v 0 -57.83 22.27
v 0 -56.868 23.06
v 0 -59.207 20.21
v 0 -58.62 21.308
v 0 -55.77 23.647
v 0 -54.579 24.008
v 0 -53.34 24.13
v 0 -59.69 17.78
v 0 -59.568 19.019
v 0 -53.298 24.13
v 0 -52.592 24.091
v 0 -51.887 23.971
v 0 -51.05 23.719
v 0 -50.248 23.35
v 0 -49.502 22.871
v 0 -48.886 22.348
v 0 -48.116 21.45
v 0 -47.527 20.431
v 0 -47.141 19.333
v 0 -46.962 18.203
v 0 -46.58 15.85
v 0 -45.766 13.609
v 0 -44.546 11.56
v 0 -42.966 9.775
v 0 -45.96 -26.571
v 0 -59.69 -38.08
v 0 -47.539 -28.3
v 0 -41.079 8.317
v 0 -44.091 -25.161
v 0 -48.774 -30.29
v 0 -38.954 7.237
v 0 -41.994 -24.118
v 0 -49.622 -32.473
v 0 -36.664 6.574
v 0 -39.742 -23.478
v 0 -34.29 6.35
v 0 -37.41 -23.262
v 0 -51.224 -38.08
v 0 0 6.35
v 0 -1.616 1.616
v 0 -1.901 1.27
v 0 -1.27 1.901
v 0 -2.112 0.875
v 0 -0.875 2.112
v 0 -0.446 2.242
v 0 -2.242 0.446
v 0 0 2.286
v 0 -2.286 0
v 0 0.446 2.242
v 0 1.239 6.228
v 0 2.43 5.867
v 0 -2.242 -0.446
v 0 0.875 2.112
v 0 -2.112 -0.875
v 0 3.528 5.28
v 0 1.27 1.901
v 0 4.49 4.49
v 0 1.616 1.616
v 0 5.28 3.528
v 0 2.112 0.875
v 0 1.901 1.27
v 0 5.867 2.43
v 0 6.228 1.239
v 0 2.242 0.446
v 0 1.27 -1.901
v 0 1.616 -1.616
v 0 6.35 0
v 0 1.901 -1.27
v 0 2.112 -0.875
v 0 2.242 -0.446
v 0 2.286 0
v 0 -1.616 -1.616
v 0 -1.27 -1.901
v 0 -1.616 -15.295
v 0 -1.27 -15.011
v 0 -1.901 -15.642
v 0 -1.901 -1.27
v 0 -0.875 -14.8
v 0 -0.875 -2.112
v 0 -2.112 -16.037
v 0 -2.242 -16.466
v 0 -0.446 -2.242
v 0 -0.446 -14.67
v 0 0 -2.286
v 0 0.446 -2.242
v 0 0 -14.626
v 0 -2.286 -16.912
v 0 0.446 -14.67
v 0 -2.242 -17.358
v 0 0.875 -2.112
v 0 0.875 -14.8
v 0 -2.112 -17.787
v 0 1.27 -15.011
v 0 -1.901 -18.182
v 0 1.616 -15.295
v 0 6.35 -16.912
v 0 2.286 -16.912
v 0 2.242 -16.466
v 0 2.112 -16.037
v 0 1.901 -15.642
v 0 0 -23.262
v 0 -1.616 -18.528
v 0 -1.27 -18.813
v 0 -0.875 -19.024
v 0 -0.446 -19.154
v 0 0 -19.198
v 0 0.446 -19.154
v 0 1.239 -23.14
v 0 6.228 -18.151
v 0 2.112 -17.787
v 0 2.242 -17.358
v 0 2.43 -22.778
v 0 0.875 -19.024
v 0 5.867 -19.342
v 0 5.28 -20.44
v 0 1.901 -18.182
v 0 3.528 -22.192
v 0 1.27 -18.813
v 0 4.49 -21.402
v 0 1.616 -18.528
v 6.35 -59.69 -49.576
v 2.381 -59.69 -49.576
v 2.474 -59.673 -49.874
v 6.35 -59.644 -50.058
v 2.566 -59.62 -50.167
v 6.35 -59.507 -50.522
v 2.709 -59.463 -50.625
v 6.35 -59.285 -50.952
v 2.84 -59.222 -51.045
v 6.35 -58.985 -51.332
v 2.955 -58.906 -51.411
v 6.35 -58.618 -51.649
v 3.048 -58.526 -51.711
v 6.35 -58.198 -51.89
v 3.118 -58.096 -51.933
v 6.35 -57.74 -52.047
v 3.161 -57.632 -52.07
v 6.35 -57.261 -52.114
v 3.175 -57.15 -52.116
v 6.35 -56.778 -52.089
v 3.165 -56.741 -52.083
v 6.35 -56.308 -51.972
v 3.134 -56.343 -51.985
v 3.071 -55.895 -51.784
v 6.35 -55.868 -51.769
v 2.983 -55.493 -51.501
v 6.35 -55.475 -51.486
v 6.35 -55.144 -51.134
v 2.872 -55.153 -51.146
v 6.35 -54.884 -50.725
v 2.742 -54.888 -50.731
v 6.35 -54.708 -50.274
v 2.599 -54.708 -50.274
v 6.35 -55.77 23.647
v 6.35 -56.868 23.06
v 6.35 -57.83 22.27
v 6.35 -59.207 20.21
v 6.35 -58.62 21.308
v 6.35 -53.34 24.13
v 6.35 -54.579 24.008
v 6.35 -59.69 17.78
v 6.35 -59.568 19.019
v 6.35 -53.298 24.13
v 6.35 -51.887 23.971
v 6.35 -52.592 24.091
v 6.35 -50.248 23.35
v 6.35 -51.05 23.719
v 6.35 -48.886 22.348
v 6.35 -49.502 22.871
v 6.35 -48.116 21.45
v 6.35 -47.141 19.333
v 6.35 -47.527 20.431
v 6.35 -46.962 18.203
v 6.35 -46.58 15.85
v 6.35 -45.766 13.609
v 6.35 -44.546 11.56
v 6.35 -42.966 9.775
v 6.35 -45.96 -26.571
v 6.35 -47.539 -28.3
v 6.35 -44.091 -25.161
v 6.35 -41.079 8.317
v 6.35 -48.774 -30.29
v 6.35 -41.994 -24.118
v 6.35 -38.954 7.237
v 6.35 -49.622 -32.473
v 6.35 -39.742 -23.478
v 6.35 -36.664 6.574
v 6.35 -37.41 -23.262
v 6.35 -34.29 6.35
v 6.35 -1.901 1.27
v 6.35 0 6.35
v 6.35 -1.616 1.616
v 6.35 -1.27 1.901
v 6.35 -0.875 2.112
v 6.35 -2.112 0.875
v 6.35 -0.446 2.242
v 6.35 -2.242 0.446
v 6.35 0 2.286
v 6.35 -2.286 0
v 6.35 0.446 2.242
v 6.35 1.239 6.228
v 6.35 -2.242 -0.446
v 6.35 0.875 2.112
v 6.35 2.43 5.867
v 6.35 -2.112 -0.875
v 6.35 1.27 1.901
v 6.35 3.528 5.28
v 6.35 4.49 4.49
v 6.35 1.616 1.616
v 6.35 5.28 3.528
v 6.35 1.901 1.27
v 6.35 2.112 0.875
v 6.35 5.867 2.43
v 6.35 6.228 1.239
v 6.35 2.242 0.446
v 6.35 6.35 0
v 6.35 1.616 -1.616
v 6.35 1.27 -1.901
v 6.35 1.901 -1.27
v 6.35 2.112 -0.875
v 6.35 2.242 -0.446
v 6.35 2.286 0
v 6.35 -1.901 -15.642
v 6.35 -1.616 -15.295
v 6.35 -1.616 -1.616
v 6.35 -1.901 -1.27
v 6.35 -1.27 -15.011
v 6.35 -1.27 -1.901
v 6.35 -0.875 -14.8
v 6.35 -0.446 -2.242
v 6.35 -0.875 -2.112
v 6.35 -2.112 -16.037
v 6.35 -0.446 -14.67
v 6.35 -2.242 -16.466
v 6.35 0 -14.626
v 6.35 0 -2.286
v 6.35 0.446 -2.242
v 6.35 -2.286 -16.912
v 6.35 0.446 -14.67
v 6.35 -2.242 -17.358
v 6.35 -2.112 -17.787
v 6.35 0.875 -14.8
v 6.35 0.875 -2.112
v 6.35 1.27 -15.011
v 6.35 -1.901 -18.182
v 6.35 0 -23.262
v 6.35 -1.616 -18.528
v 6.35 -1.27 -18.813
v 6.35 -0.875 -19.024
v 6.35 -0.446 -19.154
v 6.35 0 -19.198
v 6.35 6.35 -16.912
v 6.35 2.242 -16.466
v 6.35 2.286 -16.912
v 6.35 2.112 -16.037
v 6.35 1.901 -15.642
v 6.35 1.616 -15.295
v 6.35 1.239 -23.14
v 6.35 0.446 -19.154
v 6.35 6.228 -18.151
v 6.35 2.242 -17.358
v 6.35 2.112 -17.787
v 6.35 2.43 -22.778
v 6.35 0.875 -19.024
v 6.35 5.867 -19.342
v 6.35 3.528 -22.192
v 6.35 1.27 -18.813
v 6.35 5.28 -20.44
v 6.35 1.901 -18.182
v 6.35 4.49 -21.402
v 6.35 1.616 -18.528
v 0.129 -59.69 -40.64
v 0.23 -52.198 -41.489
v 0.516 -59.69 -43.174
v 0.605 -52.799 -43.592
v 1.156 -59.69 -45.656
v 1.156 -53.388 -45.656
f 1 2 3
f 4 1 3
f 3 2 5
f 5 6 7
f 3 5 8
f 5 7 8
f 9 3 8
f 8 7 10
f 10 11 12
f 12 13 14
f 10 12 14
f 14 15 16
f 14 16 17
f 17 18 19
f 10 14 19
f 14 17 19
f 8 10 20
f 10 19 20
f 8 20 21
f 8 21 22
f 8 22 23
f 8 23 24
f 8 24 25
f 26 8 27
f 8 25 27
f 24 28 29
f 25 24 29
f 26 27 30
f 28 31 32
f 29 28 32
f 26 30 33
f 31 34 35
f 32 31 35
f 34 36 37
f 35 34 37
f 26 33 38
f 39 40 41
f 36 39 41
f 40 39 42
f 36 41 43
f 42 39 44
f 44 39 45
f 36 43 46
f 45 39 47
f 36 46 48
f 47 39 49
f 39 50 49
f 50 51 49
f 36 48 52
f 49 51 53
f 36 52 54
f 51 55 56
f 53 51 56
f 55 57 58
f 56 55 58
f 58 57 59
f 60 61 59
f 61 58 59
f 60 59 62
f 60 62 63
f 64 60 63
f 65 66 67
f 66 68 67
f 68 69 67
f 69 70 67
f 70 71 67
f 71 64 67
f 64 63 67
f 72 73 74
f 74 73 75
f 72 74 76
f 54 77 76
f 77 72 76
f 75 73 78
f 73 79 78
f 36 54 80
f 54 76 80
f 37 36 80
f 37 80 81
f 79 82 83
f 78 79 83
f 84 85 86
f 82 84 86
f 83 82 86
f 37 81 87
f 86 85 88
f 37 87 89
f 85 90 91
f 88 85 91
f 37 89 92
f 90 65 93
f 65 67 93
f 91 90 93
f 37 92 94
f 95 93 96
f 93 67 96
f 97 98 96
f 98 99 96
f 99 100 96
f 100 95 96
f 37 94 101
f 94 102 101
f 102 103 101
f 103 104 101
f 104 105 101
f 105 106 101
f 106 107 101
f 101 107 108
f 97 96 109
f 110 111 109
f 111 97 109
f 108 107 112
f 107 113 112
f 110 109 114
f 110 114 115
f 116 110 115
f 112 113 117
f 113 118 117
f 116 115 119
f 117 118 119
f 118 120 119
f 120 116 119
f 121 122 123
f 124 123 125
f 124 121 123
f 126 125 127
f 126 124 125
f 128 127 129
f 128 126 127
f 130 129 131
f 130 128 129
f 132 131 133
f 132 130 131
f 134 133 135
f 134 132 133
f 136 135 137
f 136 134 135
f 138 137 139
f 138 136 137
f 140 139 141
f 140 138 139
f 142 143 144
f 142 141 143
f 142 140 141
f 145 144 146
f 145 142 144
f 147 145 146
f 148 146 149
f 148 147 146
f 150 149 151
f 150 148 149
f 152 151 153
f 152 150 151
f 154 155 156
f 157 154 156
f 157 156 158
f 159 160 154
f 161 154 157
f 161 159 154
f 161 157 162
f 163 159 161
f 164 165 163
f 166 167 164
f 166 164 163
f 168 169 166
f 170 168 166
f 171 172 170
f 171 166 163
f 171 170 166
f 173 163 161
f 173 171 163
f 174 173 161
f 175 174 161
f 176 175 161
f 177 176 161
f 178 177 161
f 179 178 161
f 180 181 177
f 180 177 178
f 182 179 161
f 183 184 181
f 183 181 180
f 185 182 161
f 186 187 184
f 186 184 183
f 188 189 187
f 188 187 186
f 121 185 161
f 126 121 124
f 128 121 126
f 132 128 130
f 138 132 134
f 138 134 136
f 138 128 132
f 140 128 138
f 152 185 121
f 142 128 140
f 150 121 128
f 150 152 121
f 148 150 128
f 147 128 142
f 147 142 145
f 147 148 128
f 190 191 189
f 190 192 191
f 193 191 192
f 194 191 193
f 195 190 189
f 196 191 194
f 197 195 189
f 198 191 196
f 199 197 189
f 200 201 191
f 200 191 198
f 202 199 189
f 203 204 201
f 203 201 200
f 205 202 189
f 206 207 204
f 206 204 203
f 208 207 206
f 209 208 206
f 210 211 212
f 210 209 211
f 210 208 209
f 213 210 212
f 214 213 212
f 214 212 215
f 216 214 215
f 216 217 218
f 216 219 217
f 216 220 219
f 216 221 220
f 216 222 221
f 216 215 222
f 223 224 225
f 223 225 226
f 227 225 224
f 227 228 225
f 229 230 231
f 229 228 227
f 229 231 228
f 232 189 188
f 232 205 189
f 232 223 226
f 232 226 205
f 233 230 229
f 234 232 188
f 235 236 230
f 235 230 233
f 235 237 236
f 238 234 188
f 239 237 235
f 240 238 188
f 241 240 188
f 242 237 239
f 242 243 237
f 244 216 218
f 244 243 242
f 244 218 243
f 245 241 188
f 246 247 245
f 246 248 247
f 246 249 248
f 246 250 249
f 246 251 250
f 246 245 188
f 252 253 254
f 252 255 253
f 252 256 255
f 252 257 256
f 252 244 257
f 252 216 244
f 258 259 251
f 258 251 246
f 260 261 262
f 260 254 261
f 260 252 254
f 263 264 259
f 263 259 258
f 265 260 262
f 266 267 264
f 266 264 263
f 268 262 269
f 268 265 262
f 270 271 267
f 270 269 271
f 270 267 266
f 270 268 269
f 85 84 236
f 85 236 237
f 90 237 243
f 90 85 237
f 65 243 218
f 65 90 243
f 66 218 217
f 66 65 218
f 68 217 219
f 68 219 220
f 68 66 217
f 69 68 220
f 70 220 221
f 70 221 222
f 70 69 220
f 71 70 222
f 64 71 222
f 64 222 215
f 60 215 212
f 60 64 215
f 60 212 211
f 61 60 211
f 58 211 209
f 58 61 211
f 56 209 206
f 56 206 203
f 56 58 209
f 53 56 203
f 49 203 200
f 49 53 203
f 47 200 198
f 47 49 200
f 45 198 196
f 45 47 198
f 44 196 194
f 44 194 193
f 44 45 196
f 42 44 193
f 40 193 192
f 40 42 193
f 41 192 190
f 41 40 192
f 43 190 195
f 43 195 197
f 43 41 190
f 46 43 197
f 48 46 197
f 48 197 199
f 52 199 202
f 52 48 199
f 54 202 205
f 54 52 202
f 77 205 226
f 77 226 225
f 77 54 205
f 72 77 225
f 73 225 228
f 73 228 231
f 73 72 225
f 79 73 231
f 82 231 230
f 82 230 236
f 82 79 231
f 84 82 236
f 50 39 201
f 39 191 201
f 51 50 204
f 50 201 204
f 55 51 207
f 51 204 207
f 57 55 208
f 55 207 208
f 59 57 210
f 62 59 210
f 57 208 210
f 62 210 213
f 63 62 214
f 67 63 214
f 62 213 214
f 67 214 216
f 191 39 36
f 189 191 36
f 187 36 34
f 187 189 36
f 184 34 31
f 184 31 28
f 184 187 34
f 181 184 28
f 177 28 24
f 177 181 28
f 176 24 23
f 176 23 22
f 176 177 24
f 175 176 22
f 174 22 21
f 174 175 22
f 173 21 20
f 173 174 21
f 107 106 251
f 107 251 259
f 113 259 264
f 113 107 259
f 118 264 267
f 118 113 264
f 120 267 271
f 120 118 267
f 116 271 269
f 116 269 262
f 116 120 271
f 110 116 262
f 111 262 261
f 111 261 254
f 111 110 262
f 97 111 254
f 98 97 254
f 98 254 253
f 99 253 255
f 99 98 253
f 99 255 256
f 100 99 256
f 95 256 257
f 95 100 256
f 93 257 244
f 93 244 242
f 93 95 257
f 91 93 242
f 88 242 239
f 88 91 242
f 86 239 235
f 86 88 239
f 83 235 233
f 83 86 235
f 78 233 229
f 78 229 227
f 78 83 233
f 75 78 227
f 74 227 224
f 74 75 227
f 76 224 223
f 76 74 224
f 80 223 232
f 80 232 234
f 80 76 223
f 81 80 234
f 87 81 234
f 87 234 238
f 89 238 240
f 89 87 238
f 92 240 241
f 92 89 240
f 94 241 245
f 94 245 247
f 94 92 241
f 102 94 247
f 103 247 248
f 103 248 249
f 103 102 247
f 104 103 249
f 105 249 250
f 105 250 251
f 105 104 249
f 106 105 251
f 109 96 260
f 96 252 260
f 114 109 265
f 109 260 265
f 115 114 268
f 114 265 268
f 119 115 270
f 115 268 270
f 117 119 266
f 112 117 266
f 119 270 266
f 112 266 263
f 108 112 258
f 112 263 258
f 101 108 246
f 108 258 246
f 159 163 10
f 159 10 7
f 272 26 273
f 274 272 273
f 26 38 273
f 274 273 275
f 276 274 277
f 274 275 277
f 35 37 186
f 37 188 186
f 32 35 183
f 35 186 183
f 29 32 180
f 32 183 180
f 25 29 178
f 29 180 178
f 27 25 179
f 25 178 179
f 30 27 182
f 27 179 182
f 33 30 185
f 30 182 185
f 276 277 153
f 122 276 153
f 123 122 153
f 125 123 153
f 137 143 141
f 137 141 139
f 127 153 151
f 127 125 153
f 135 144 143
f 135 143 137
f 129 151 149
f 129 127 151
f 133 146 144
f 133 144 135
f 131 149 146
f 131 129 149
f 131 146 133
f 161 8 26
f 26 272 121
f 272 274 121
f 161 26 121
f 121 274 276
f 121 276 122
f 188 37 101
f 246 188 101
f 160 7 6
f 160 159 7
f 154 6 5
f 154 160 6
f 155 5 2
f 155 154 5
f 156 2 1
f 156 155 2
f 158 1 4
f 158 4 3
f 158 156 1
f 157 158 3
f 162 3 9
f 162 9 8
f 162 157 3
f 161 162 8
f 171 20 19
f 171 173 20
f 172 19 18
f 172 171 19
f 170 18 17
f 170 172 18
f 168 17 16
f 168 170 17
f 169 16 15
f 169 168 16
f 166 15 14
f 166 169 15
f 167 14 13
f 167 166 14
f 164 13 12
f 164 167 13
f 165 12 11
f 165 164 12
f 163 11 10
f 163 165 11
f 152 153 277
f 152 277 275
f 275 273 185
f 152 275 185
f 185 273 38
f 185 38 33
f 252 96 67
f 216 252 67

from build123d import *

# Parameters (mm, degrees)
SKETCH1_R           = 2.286
BOSS_EXTRUDE1_DEPTH = 6.35
FILLET1_R           = 12.7
FILLET2_R           = 6.35
FILLET3_R           = 2.54
CUT_EXTRUDE1_DEPTH  = 85.366399734
FILLET4_R           = 25.4


with BuildPart() as part:
    # Sketch1 → Boss-Extrude1 (new body)
    with BuildSketch(Plane(origin=(0, 0, 0), x_dir=(0, 0, -1), z_dir=(1, 0, 0))):
        Polygon((-6.35, 6.35), (-6.35, -46.99), (-24.13, -46.99), (-24.13, -59.69), (67.711814614, -59.69), (23.261814614, -46.99), (23.261814614, 6.35), align=None)
        Circle(SKETCH1_R, mode=Mode.SUBTRACT)
        with Locations((16.911814614, 0)):
            Circle(SKETCH1_R, mode=Mode.SUBTRACT)
    extrude(amount=BOSS_EXTRUDE1_DEPTH)

    # Fillet1
    fillet1_edges = [part.edges().sort_by_distance(p)[0] for p in [
        (3.175, -46.99, -23.261814614),
        (3.175, -46.99, 6.35),
    ]]
    fillet(fillet1_edges, radius=FILLET1_R)

    # Fillet2
    fillet2_edges = [part.edges().sort_by_distance(p)[0] for p in [
        (3.175, 6.35, 6.35),
        (3.175, 6.35, -23.261814614),
        (3.175, -59.69, 24.13),
        (3.175, -46.99, 24.13),
    ]]
    fillet(fillet2_edges, radius=FILLET2_R)

    # Fillet3
    fillet3_edges = [part.edges().sort_by_distance(p)[0] for p in [
        (3.175, -59.69, -67.711814614),
    ]]
    fillet(fillet3_edges, radius=FILLET3_R)

    # Sketch2 → Cut-Extrude1 (cut, through all)
    with BuildSketch(Plane.XZ.offset(59.69)):
        Polygon((0, -41.956075055), (3.175, -52.116075055), (0, -52.116075055), align=None)
    extrude(amount=-CUT_EXTRUDE1_DEPTH, mode=Mode.SUBTRACT)

    # Fillet4
    fillet4_edges = [part.edges().sort_by_distance(p)[0] for p in [
        (0, -56.010608634, -41.956075055),
    ]]
    fillet(fillet4_edges, radius=FILLET4_R)


solid = part.part
